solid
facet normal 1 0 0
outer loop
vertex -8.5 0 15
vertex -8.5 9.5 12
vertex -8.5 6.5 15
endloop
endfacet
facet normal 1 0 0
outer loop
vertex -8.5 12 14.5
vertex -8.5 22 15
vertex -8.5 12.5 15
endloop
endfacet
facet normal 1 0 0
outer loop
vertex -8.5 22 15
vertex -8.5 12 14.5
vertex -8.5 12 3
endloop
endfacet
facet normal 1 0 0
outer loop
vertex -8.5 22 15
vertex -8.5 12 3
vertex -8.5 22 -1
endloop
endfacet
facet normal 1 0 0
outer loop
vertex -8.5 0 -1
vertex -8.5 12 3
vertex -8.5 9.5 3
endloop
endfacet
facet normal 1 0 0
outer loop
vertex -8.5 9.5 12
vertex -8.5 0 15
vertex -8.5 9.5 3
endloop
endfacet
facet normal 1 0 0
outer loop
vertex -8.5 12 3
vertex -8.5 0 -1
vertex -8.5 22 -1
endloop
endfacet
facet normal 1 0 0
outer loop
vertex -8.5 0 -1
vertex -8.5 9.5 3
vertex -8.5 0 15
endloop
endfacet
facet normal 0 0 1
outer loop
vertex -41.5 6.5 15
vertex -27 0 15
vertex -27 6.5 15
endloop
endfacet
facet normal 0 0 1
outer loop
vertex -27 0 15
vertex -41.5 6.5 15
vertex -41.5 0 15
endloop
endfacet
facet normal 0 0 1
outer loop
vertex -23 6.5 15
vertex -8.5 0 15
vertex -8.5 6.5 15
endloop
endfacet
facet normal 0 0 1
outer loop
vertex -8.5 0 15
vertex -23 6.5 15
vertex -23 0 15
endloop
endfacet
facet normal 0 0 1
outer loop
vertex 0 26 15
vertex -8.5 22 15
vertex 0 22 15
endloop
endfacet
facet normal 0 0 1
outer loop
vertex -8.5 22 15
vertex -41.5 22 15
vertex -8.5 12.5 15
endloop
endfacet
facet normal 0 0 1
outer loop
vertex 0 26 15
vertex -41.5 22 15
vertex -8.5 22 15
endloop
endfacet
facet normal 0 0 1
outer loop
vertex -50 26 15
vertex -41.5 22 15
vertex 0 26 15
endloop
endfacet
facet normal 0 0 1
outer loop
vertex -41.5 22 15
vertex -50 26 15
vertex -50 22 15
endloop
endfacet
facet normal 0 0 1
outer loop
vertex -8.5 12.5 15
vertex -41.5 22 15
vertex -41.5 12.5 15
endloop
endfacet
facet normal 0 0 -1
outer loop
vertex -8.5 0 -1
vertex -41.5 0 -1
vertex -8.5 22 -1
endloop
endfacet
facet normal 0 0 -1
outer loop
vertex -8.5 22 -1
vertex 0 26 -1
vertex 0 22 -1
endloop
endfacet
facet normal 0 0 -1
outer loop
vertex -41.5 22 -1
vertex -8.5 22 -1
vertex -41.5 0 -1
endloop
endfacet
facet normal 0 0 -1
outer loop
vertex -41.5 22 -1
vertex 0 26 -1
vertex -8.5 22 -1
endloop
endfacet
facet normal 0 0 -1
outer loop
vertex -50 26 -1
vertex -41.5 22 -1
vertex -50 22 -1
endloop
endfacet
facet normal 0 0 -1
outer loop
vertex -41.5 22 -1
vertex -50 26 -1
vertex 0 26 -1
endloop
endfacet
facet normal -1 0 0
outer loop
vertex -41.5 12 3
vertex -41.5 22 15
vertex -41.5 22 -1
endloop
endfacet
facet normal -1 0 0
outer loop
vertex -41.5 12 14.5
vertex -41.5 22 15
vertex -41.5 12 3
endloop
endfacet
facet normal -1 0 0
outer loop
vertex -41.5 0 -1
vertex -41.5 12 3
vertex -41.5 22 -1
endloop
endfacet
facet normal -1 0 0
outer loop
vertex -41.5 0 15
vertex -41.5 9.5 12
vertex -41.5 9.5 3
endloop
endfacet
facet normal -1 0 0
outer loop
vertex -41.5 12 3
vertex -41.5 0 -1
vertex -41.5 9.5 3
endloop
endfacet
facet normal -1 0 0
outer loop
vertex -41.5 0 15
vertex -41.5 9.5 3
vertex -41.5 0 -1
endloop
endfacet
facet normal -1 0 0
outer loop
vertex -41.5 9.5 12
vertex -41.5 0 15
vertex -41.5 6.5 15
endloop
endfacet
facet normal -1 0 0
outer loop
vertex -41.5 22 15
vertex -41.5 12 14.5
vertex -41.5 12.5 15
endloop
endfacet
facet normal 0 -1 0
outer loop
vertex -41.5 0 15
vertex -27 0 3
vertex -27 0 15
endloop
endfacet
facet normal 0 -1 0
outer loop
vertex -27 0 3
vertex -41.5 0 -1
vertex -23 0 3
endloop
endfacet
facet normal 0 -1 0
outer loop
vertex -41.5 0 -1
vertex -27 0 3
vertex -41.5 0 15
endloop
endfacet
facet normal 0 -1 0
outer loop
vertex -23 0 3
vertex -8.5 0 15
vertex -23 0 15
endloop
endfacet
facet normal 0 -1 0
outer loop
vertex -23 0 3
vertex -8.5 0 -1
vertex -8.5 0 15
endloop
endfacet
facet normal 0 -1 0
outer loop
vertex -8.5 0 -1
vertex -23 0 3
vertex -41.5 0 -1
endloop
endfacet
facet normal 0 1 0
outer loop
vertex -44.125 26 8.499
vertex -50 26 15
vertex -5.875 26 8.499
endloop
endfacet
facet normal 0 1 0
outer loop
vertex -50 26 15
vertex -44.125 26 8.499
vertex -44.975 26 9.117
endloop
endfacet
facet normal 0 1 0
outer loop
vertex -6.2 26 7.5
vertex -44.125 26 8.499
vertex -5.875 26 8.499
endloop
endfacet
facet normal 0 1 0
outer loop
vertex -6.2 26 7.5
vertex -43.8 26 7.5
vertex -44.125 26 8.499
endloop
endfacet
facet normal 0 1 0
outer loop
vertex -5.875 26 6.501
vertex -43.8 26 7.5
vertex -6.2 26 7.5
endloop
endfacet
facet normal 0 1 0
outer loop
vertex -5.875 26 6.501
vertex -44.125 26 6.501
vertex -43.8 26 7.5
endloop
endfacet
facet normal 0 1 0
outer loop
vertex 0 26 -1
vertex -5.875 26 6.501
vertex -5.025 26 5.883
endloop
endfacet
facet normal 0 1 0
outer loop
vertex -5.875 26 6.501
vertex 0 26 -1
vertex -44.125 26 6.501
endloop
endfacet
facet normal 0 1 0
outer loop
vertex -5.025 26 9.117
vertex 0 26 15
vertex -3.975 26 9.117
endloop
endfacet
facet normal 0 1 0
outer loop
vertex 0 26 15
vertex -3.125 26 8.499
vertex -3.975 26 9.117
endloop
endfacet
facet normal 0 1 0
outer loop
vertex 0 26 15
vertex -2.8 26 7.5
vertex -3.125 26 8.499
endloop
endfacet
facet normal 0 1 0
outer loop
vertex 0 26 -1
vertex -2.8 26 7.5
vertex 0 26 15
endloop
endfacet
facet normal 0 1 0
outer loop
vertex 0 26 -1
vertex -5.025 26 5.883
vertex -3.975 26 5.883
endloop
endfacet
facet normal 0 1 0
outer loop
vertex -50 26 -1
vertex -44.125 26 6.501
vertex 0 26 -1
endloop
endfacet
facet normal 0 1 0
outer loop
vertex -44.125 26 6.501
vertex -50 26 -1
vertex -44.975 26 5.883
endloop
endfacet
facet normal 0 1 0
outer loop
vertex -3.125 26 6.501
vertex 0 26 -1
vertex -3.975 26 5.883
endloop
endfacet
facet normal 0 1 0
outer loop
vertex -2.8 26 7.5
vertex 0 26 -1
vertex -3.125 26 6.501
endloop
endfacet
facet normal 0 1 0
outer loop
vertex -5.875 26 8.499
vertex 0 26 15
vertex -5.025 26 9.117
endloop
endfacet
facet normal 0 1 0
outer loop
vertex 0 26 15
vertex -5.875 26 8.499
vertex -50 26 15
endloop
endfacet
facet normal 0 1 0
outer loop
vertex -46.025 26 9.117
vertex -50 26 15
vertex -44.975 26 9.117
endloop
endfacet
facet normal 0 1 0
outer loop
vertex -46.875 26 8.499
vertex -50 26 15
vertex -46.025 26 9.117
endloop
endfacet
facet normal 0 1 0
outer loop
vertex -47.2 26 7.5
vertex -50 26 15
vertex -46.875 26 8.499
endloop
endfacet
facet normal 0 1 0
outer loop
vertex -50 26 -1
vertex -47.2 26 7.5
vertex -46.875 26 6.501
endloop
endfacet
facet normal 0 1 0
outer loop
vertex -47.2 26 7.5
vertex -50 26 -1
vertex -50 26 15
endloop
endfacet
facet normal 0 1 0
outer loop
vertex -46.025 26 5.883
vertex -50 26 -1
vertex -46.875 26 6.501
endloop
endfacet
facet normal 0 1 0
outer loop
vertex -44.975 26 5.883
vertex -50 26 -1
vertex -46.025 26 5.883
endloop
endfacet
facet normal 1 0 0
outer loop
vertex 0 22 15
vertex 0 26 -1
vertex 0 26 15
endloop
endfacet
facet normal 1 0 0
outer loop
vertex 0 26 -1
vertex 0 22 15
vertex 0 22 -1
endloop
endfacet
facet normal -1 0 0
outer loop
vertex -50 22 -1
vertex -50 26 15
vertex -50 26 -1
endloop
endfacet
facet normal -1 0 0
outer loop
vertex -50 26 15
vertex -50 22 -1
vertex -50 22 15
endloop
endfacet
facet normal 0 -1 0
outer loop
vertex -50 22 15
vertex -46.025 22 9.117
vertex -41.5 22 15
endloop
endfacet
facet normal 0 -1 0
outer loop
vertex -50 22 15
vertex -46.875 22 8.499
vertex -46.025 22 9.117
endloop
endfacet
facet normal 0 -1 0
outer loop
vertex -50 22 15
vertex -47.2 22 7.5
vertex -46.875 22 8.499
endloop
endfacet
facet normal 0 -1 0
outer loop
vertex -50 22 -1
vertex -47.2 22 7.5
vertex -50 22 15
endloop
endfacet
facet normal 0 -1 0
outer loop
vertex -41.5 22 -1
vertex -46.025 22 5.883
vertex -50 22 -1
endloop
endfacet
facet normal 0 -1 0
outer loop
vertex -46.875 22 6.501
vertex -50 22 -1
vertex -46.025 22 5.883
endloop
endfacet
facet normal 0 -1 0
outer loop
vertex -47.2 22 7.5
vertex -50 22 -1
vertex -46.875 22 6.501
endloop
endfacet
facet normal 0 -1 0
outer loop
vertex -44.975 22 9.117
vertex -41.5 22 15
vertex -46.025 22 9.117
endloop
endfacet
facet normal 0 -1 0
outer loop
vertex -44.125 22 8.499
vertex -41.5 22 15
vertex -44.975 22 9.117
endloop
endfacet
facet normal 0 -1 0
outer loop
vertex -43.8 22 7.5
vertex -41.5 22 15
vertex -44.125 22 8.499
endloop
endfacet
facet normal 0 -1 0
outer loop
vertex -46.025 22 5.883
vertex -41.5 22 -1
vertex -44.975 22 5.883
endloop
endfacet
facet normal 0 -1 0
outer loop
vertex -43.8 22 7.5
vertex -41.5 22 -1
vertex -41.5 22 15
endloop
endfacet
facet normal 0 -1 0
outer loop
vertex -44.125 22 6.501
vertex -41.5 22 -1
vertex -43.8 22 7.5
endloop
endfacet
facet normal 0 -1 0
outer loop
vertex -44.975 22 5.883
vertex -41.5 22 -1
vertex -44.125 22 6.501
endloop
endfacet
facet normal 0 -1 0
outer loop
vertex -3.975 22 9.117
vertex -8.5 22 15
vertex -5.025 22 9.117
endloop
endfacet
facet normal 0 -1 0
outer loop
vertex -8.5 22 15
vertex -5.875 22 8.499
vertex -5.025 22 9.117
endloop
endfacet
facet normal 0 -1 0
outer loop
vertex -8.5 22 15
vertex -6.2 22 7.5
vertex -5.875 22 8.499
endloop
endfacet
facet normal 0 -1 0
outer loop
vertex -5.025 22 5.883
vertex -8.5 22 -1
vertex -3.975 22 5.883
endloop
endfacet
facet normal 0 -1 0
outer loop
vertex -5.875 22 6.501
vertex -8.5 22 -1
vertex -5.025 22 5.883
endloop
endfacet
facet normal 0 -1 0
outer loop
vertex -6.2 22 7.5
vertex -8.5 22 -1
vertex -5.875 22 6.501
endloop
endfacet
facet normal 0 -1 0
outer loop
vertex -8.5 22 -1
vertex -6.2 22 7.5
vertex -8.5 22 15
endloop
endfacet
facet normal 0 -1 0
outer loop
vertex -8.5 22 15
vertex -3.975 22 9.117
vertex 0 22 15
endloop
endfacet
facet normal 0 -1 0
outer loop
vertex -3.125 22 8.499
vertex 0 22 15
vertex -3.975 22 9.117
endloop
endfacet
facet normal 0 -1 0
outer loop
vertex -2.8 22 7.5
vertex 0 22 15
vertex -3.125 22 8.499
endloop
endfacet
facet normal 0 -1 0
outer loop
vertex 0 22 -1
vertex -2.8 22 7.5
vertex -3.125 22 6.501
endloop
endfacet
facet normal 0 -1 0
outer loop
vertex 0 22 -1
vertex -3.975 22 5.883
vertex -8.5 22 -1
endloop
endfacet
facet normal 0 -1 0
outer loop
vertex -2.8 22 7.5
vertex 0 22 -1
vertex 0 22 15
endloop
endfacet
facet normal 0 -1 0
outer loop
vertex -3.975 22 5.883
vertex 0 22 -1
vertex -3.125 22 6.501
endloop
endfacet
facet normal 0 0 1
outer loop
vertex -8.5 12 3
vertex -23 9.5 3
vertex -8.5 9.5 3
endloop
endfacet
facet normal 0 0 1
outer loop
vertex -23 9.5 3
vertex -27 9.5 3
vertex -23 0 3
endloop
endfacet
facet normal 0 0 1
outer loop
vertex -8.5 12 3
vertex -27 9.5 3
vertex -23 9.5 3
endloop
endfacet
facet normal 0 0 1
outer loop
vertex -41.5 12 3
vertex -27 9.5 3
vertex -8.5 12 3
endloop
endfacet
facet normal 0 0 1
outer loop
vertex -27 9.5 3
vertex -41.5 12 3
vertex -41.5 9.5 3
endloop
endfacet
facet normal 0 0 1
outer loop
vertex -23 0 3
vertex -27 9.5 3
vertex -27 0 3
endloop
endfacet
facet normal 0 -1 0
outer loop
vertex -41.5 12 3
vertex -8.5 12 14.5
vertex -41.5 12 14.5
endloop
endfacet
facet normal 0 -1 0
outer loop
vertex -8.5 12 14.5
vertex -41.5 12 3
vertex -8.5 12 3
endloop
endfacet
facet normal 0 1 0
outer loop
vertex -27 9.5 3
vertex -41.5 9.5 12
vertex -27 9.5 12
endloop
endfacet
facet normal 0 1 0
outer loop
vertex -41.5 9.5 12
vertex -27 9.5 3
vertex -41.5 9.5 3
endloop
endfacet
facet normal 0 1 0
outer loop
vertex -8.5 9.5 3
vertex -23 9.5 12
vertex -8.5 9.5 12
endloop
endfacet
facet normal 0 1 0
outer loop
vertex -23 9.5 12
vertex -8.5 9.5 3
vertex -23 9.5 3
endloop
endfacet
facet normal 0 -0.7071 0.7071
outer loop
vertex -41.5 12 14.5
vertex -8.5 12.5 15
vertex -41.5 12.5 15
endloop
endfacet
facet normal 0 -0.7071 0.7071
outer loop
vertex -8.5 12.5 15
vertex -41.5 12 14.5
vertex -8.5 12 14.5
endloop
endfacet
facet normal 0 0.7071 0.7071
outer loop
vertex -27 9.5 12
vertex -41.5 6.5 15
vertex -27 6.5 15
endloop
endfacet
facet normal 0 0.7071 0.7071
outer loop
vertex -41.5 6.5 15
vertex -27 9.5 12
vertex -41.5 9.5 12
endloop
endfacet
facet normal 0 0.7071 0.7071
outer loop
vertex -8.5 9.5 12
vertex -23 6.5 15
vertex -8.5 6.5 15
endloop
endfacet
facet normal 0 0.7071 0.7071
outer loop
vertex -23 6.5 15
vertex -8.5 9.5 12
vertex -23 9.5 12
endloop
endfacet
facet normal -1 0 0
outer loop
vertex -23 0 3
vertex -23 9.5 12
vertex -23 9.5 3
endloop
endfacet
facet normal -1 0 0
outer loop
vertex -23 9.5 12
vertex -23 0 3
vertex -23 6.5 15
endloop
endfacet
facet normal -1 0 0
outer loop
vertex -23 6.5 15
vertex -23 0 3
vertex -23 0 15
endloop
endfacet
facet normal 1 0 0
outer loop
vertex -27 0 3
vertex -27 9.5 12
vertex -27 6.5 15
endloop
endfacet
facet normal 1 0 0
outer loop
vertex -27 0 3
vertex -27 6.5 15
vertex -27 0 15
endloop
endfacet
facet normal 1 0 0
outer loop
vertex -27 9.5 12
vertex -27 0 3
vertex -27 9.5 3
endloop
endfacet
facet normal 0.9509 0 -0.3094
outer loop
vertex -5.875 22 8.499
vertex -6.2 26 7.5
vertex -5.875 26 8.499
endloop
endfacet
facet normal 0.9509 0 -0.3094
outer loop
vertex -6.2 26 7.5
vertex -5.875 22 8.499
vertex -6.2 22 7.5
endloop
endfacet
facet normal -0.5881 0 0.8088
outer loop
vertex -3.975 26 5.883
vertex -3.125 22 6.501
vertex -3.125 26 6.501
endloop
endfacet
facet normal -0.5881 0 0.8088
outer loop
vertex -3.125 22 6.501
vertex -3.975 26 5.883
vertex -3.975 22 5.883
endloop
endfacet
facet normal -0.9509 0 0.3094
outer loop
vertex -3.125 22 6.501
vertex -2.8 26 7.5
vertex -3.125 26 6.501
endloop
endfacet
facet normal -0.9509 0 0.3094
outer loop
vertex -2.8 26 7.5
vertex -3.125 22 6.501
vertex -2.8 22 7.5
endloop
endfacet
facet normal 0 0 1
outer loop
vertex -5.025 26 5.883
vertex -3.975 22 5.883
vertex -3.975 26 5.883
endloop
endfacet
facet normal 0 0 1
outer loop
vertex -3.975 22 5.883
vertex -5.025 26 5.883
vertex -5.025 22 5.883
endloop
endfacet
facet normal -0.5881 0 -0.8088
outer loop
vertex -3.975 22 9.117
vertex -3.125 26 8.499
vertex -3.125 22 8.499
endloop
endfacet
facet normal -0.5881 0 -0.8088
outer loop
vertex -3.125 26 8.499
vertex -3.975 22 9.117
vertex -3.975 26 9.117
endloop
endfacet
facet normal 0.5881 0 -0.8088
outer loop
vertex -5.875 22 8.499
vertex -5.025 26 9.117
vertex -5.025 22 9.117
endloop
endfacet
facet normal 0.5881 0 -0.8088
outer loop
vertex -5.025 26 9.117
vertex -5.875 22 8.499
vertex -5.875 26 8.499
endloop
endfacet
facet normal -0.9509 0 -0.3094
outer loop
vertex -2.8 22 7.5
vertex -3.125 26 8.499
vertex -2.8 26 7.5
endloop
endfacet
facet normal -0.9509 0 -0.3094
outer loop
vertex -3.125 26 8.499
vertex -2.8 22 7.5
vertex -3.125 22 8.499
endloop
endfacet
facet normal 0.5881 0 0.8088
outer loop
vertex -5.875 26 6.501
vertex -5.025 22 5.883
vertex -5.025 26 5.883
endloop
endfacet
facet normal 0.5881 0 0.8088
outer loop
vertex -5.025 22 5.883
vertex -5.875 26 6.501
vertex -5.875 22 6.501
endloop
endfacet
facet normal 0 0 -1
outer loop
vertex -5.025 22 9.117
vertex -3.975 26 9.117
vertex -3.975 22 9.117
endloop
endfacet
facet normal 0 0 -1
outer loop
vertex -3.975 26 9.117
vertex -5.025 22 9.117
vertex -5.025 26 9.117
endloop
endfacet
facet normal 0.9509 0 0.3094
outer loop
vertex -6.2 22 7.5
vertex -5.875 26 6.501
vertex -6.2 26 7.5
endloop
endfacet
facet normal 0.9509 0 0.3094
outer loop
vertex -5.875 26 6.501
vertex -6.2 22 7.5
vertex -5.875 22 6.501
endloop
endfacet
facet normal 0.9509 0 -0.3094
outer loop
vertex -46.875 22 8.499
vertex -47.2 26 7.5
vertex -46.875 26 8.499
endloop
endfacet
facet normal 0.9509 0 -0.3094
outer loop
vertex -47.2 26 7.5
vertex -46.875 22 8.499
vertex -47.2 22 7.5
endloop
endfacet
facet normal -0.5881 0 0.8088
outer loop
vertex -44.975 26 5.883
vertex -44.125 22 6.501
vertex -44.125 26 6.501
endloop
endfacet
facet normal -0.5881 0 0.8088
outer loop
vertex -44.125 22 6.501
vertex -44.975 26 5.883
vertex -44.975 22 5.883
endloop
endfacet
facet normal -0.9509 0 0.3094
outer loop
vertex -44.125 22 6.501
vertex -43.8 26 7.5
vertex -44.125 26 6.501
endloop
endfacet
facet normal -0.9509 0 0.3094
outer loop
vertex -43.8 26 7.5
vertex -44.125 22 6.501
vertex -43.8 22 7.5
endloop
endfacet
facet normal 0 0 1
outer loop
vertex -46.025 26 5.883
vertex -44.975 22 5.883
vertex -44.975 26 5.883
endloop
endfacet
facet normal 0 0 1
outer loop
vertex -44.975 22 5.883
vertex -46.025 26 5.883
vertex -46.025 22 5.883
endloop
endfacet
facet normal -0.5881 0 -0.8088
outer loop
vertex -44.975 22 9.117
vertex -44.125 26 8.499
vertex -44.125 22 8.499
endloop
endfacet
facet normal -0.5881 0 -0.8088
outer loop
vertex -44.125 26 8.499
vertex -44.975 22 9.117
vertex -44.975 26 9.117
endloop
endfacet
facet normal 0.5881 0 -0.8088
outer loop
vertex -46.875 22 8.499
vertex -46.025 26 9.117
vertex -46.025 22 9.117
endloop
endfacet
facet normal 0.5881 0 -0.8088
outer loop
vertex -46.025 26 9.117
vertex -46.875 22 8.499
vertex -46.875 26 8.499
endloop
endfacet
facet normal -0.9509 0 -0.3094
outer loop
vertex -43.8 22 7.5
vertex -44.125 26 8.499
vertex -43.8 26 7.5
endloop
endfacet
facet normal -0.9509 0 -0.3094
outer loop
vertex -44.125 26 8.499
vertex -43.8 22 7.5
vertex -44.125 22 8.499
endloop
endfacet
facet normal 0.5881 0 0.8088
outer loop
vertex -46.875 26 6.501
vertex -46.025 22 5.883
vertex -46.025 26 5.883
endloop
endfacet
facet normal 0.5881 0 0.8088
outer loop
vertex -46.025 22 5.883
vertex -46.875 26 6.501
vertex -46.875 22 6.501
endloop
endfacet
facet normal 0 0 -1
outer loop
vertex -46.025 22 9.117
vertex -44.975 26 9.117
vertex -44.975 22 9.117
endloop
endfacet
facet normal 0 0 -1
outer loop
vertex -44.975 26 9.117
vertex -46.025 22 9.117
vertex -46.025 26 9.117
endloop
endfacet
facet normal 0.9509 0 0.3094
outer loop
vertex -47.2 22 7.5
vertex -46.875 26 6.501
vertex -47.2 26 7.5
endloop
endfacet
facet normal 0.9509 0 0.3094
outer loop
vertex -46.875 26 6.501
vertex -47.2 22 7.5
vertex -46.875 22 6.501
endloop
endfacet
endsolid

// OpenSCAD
// PRUSA iteration3
// Y belt holder
// GNU GPL v3
// Josef Průša <iam@josefprusa.cz> and contributors
// http://www.reprap.org/wiki/Prusa_Mendel
// http://prusamendel.org


module belt_holder_base(){
 translate([-33-8.5,0,-1]) cube([33,15,16]); 
 translate([-33-8.5,11,-1]) cube([33,15,16]);
 translate([-50,22,-1]) cube([50,4,16]);	
}

module belt_holder_beltcut(){
 position_tweak=-0.2;
 // Belt slit
 translate([-66,-0.5+10,3]) cube([67,2.5,15]);
 // Smooth insert cutout
 translate([-66,-0.5+10,12]) rotate([45,0,0]) cube([67,15,15]);
 // Individual teeth
// for ( i = [0 : 23] ){
//  translate([0-i*3+position_tweak,-0.5+8,3]) cube([1.7,3,15]);
// }
 // Middle opening
 translate([-2-25,-1,3]) cube([4,11,15]);	
}

module belt_holder_holes(){
 translate([-4.5,0,7.5]) rotate([-90,0,0]) cylinder(h=30, r=1.7, $fn=10);
 translate([-45.5,0,7.5]) rotate([-90,0,0]) cylinder(h=30, r=1.7, $fn=10);
}

// Final part
module belt_holder(){
 difference(){
  belt_holder_base();
  belt_holder_beltcut();
  belt_holder_holes();
 }
}

belt_holder();
